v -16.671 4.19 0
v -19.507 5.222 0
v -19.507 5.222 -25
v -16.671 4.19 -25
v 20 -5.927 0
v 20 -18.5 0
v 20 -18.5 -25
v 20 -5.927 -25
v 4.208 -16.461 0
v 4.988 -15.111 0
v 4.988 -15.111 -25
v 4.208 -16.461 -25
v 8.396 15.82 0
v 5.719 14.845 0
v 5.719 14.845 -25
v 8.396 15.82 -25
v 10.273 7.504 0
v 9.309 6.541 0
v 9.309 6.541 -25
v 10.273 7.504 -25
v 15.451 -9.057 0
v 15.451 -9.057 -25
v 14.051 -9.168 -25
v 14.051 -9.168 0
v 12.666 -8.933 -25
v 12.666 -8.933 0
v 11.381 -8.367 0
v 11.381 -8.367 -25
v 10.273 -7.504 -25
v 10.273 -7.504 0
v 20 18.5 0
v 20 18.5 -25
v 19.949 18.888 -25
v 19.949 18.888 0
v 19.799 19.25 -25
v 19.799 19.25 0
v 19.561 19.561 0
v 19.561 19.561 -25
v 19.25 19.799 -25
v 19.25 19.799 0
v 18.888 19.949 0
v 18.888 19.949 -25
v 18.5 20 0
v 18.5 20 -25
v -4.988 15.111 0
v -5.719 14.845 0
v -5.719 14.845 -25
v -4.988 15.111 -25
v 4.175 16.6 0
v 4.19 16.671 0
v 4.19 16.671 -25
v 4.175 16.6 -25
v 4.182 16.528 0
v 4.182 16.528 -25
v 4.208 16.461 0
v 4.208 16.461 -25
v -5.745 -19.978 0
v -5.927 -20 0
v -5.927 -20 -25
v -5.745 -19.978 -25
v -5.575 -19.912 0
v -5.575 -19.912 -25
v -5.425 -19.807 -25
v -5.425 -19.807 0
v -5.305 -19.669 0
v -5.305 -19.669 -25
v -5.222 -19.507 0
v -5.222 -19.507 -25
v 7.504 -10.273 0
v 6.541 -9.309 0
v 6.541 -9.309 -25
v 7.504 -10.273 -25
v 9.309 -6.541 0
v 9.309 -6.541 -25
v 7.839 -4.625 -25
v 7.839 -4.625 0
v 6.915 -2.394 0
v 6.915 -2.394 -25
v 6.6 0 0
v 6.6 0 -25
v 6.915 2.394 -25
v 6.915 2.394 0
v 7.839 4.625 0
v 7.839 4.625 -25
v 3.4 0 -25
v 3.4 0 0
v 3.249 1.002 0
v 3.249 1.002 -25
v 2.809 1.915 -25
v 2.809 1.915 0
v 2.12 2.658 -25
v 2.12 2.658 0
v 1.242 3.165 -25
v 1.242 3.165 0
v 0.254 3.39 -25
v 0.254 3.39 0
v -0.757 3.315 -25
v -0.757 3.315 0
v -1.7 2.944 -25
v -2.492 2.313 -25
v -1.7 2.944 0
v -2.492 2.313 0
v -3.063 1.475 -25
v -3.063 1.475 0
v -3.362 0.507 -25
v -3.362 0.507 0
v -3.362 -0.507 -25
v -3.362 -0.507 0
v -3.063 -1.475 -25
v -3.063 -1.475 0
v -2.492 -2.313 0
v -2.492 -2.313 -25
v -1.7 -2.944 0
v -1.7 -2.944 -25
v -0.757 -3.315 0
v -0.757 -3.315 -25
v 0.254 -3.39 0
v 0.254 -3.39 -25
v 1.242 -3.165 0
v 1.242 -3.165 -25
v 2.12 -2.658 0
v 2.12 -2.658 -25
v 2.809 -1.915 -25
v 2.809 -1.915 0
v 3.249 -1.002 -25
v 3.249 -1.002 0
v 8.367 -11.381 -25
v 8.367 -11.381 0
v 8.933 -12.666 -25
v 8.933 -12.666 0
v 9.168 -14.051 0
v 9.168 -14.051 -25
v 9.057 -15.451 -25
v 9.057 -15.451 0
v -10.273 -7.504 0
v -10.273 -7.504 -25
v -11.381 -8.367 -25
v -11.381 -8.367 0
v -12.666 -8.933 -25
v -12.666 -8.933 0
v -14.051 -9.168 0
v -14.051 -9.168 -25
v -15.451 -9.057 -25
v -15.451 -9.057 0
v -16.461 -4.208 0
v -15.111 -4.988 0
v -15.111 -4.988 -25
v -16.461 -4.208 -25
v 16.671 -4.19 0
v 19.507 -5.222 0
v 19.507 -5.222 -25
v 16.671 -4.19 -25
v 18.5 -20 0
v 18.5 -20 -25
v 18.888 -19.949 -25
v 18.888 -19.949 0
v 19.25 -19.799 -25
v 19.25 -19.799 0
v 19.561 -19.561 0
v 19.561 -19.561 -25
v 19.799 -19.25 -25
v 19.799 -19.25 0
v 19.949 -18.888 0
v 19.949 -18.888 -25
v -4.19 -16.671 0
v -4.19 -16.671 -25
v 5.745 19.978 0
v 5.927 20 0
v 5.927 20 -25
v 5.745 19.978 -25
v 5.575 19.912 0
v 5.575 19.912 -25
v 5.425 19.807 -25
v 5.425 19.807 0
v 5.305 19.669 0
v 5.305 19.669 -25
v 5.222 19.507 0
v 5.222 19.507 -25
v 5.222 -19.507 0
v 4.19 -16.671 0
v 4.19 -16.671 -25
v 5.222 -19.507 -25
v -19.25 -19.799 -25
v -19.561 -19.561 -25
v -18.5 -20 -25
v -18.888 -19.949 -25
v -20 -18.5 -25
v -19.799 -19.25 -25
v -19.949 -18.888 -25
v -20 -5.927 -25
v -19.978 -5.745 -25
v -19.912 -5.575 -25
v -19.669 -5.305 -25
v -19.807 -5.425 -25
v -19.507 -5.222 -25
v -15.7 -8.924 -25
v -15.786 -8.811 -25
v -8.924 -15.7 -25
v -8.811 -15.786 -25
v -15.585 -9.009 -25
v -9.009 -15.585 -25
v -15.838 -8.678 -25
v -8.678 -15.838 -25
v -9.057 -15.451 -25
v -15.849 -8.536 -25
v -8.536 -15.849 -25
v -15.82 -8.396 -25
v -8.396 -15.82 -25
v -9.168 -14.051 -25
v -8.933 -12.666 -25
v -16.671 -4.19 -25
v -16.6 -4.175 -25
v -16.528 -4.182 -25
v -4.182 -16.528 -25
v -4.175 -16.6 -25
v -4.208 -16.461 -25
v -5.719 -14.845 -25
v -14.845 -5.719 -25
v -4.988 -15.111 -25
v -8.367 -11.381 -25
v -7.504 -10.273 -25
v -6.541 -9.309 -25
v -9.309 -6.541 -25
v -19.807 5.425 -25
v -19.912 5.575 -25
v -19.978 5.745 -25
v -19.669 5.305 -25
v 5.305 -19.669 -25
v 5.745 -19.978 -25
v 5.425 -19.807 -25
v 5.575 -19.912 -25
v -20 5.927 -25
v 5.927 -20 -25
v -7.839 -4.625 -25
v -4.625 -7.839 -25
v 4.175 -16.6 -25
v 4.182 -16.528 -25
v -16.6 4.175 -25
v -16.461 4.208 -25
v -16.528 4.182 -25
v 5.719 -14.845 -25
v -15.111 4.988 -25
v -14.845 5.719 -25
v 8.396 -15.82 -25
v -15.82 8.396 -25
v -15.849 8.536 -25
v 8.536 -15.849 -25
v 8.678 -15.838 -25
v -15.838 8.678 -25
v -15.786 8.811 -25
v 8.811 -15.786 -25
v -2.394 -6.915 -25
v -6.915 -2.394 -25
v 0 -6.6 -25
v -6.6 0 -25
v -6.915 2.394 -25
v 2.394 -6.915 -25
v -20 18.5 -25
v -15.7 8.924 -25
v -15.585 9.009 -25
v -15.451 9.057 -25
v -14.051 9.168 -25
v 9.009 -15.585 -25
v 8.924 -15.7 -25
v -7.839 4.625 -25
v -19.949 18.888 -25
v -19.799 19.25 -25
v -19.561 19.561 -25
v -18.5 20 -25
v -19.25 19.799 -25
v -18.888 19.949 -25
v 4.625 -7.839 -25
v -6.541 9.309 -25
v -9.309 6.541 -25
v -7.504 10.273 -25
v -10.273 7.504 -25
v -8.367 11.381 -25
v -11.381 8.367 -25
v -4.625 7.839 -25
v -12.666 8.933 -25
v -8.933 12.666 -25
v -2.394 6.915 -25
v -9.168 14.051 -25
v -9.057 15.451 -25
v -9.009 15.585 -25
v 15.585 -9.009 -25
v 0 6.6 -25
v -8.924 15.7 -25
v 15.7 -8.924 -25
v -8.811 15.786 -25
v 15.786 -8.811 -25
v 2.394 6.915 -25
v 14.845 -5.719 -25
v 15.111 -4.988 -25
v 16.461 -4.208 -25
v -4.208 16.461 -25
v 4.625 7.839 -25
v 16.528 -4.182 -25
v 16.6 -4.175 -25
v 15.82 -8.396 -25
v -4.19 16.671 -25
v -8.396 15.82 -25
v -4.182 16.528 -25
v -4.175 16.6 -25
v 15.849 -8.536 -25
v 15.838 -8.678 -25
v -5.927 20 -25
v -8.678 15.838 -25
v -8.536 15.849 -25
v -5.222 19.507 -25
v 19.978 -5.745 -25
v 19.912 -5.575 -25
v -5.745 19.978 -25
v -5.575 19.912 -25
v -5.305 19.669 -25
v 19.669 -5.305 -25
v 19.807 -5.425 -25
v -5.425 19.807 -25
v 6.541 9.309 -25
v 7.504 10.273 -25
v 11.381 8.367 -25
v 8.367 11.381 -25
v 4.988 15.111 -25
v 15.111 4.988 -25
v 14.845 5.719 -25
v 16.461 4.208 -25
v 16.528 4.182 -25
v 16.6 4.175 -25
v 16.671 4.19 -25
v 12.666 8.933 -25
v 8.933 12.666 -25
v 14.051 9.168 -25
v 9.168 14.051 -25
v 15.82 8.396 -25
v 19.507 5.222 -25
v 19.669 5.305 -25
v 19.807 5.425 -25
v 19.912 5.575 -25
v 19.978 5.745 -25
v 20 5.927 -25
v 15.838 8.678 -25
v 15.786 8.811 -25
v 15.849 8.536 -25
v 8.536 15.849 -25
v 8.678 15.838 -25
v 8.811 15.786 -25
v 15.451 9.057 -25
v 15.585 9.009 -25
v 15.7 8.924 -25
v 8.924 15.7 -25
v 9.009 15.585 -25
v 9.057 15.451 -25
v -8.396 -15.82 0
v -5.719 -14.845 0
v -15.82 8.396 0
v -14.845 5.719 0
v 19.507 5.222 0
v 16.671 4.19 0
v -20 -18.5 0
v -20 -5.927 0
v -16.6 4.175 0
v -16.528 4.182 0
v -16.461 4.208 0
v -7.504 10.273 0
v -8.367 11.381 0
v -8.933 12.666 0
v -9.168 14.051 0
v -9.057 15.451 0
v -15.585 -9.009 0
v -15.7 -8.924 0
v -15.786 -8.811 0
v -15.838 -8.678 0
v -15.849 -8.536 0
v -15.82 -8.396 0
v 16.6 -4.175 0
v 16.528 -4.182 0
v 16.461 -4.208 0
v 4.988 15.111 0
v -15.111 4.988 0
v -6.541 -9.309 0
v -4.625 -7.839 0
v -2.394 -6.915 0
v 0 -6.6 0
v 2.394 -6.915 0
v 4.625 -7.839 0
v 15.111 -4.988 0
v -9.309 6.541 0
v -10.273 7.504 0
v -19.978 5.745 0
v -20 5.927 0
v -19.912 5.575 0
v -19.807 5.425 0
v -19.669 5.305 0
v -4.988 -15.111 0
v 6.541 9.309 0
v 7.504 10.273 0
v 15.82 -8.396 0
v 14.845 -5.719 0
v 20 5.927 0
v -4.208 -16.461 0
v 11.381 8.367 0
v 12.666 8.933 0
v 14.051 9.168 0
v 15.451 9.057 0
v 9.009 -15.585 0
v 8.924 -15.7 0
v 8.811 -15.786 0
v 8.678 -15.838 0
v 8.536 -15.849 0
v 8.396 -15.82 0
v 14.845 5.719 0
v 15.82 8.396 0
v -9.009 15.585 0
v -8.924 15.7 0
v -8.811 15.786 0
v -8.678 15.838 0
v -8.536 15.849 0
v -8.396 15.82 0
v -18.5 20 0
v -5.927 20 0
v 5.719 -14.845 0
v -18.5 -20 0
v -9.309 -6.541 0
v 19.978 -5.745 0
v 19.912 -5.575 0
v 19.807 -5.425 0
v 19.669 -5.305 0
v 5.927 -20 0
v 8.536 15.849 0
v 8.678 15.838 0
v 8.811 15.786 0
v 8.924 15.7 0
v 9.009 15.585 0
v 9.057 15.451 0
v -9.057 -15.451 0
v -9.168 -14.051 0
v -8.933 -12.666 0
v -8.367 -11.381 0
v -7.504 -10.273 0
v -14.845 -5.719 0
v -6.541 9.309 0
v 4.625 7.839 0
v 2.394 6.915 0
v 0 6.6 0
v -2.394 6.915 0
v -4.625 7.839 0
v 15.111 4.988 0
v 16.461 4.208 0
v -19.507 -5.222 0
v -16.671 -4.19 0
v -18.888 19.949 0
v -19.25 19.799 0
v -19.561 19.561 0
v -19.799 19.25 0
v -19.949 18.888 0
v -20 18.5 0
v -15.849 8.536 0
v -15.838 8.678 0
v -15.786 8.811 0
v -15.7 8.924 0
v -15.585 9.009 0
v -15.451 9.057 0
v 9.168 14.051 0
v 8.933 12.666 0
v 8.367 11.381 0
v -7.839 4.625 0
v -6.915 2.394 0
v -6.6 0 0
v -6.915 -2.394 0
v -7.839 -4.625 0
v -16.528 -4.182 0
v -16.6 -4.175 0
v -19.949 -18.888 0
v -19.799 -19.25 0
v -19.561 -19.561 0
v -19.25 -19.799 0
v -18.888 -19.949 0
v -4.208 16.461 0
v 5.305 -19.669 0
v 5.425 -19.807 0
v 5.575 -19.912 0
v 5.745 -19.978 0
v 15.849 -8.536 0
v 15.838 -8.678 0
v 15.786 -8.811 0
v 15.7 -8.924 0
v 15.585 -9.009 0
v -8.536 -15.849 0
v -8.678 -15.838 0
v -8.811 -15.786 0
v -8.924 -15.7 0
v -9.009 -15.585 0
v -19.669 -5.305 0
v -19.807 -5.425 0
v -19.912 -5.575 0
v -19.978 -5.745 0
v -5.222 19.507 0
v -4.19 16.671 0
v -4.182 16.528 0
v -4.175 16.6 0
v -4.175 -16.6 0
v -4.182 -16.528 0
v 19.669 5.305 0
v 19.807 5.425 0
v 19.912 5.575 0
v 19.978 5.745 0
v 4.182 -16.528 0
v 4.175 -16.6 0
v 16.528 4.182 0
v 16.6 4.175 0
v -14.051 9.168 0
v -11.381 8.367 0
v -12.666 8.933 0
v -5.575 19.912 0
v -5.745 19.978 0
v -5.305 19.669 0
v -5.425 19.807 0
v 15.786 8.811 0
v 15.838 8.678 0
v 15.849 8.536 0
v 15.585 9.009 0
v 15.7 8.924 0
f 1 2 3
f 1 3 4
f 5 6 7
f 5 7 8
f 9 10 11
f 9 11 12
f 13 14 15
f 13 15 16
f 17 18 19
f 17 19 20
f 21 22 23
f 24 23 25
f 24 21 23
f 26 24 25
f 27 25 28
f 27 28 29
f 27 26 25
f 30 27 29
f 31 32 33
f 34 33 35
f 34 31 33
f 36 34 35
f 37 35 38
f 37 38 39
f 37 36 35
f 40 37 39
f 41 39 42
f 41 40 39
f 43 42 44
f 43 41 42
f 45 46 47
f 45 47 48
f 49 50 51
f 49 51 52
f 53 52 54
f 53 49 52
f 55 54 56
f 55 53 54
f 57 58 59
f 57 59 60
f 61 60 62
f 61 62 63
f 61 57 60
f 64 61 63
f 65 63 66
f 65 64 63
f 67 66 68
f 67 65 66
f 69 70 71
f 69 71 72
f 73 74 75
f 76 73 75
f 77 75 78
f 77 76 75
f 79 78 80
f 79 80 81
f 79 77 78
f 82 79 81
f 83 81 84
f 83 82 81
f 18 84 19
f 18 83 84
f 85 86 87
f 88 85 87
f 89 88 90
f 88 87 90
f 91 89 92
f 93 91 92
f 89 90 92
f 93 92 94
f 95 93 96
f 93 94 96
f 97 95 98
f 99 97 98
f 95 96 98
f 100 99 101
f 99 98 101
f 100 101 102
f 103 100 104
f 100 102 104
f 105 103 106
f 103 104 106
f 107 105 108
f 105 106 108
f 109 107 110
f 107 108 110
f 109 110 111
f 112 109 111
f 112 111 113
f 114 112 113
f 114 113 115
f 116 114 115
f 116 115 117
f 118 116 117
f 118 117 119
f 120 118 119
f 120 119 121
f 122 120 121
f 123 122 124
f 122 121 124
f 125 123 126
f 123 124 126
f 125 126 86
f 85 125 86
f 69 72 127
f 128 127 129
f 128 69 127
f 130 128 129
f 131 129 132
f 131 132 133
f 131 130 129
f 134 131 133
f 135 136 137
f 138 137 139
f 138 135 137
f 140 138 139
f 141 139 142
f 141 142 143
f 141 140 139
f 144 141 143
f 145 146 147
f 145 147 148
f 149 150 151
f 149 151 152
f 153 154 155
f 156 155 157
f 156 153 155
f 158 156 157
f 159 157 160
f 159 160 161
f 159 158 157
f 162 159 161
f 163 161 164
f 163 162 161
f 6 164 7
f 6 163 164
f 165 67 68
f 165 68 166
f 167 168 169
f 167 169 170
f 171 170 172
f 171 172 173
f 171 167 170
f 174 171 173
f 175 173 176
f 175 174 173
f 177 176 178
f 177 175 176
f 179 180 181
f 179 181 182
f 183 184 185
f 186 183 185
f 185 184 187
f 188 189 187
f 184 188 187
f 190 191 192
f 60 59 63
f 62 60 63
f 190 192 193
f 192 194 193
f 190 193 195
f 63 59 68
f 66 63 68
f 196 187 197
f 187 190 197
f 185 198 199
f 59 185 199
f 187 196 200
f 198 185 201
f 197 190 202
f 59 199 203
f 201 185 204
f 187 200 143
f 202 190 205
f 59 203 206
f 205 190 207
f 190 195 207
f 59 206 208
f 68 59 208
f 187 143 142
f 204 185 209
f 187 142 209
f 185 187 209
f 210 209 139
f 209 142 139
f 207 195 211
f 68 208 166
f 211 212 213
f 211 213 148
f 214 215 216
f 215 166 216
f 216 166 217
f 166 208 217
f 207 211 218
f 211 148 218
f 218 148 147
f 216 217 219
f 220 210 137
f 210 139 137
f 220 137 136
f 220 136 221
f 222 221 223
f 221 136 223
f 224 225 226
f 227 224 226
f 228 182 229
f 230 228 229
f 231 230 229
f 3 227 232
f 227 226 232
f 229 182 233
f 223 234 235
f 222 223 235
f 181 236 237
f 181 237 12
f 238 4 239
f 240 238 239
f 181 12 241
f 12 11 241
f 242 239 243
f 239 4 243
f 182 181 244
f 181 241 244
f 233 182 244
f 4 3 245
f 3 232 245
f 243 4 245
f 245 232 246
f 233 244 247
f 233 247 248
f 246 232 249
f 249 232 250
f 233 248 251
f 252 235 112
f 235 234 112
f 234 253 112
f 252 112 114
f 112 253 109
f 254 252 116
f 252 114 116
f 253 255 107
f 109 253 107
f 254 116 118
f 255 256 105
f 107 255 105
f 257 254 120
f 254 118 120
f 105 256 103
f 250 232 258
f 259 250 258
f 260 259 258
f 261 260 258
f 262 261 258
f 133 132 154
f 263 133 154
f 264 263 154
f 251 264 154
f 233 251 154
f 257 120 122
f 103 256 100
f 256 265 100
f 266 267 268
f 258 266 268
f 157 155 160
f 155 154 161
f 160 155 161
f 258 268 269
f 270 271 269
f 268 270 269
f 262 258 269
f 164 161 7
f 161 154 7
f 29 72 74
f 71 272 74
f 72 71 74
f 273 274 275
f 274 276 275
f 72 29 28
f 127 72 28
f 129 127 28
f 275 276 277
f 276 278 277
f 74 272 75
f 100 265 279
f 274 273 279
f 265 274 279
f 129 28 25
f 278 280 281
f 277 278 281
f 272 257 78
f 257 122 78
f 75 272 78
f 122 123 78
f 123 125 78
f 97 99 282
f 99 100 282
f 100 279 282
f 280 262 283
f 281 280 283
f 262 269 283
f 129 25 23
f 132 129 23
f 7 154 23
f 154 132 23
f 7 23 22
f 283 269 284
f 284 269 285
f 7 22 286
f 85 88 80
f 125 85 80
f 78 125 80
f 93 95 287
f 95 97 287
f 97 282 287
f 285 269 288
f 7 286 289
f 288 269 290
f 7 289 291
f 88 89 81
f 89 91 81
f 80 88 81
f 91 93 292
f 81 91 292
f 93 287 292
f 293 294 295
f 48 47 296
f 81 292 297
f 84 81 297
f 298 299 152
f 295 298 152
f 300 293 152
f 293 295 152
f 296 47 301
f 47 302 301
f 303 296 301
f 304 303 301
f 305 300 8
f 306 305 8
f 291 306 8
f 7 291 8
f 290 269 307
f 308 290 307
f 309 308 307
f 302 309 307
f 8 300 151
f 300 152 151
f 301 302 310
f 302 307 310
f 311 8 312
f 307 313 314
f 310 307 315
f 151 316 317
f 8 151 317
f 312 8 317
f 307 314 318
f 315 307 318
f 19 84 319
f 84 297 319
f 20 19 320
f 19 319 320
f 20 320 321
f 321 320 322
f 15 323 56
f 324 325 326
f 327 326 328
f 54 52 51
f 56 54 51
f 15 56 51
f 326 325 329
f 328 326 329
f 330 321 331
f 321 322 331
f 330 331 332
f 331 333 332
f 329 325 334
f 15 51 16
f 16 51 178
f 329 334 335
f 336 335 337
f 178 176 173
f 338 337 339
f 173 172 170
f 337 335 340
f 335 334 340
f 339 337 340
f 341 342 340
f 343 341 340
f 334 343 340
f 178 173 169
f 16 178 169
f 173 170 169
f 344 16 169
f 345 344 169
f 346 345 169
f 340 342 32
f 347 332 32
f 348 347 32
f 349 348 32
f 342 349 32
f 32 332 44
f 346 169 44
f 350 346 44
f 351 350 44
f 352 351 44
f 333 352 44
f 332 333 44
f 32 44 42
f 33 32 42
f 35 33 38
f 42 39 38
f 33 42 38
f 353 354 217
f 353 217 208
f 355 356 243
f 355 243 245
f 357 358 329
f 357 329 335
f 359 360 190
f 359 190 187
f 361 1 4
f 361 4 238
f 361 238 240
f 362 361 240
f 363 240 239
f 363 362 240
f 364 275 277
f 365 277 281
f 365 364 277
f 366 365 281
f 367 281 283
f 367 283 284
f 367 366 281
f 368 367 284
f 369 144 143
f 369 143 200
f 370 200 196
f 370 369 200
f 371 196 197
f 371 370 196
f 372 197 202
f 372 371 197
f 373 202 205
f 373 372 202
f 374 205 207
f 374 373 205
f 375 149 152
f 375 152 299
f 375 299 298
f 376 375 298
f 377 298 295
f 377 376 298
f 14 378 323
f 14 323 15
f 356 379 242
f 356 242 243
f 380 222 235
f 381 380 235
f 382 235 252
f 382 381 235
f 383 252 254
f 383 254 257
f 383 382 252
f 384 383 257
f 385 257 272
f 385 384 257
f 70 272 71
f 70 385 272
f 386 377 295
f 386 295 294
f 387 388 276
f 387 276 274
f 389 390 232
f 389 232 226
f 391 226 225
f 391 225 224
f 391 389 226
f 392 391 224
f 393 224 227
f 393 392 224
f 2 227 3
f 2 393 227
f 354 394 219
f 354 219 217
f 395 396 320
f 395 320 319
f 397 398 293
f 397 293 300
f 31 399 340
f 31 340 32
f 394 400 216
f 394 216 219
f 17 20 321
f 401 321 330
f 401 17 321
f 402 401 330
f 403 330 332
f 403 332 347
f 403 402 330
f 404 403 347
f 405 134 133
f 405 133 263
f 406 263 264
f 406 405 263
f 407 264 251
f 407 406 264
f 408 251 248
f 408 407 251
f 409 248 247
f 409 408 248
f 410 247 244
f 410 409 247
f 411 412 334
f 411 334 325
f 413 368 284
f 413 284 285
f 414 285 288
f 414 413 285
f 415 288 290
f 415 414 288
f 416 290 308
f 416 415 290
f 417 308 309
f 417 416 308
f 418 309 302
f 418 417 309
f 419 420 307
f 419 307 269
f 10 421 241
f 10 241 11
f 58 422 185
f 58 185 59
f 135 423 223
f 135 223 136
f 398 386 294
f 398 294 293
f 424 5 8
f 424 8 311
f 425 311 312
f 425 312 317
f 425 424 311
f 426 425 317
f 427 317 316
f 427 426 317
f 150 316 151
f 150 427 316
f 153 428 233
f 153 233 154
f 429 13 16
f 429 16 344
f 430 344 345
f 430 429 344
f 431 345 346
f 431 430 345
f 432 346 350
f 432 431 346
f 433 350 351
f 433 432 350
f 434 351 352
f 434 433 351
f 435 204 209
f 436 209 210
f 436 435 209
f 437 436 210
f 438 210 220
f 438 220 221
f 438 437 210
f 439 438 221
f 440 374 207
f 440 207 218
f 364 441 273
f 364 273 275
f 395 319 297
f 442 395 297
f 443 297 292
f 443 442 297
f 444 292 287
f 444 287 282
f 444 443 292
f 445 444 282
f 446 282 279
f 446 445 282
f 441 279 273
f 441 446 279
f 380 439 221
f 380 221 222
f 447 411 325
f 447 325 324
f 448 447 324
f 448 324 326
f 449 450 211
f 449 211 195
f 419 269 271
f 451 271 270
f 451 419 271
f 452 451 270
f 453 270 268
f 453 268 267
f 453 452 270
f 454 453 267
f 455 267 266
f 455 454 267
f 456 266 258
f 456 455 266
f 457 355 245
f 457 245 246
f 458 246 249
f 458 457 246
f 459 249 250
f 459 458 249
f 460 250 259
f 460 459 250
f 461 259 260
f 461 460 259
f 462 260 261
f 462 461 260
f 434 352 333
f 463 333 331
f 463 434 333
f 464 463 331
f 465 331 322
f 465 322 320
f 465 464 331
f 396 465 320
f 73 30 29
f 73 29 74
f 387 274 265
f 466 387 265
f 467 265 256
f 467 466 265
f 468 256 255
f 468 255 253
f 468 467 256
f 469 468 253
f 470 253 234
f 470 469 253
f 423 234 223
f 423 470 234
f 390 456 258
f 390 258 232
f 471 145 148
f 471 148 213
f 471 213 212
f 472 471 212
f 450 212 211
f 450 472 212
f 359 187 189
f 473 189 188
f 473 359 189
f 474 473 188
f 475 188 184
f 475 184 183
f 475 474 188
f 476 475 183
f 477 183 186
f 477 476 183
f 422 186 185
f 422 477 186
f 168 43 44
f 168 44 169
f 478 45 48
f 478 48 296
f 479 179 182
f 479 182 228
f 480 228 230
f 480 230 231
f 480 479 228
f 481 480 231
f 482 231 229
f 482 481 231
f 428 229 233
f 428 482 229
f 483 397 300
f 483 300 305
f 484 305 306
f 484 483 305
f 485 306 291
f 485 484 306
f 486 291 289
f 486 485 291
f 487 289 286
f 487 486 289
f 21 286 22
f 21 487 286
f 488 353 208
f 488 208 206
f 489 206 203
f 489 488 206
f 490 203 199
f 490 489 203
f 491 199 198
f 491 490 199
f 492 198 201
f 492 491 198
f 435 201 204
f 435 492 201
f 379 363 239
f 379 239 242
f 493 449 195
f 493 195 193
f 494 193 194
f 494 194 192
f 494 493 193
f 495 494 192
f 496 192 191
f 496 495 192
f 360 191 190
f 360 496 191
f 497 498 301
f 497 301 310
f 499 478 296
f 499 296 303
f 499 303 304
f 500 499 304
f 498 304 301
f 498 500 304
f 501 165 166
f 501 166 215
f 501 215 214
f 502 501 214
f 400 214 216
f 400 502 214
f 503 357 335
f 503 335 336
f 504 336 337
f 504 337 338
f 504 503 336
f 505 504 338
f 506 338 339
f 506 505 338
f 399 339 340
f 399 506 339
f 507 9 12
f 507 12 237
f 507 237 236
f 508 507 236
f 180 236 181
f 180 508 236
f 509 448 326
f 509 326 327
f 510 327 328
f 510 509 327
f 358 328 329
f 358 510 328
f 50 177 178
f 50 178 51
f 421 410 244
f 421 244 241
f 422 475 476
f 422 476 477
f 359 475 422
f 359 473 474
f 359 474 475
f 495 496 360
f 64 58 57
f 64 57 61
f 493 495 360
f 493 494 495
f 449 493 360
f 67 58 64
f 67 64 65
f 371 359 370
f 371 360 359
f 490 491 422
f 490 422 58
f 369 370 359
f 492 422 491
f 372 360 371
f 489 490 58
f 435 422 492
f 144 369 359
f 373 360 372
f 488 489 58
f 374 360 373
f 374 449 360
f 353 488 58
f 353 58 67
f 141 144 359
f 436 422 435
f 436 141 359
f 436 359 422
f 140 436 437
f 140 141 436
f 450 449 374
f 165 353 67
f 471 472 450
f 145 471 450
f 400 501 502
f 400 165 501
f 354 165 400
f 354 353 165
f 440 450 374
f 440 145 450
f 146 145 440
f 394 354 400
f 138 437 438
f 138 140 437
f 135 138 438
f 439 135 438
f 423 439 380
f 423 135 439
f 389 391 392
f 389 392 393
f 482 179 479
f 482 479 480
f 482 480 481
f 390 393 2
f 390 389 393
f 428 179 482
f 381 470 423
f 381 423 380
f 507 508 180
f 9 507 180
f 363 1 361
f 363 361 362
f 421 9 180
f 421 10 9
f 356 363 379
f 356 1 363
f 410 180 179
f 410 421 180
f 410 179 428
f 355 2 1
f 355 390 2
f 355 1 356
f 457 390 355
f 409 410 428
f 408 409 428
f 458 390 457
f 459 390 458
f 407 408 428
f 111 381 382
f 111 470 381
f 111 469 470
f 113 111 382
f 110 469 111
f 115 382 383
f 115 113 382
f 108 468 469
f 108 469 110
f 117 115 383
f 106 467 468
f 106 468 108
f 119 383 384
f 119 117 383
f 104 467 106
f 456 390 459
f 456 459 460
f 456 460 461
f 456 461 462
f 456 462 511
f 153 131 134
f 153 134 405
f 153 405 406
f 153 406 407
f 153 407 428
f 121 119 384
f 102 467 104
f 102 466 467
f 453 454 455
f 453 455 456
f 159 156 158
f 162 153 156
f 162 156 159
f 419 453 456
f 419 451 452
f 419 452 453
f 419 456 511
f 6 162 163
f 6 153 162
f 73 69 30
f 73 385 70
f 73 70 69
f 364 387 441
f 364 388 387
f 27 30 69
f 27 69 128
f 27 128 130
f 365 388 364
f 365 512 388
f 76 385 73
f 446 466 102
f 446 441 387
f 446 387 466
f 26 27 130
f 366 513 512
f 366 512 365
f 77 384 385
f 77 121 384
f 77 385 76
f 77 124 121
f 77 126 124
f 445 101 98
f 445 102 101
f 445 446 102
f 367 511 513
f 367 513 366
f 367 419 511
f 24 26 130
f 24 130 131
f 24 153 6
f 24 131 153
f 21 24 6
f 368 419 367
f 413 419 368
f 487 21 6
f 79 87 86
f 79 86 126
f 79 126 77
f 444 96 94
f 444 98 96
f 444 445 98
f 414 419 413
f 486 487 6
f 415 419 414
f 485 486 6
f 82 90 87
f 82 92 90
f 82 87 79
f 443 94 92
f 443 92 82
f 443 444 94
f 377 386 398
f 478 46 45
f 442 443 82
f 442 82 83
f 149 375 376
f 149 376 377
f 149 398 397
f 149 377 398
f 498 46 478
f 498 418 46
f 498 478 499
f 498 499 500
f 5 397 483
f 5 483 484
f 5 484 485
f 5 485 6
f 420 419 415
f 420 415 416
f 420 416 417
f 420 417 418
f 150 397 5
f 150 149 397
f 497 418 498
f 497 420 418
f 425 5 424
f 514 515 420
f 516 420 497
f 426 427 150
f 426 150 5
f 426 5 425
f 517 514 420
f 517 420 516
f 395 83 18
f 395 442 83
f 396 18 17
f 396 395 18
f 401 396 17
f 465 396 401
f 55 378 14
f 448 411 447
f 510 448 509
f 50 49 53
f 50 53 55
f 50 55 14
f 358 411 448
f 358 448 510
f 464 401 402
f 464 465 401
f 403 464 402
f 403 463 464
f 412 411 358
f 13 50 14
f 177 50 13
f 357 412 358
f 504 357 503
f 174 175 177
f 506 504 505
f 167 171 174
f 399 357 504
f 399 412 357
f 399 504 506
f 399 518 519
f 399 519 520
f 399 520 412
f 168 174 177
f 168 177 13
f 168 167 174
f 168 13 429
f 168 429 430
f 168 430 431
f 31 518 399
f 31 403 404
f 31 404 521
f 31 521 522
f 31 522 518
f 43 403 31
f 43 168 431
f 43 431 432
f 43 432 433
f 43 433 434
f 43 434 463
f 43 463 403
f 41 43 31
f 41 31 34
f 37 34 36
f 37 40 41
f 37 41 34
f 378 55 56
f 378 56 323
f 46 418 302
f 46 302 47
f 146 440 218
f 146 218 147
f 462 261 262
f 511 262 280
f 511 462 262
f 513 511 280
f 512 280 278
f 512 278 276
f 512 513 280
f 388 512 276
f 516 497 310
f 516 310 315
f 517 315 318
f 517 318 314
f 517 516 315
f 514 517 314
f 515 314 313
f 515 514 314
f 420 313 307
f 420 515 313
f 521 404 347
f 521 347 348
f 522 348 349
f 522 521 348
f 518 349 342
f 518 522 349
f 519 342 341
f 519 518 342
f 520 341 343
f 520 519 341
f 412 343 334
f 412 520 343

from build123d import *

# Parameters (mm, degrees)
SK_MAIN_EXTRUSION_R  = 3.4
MAIN_EXTRUSION_DEPTH = 25


with BuildPart() as part:
    # Sk Main Extrusion → Main Extrusion (new body)
    with BuildSketch(Plane.XY):
        with BuildLine():
            Line((4.190076845, -16.671180212), (5.222054351, -19.506515107))
            ThreePointArc((5.222054351, -19.506515107), (5.496641489, -19.864364033), (5.926823816, -20))
            Line((5.926823816, -20), (18.5, -20))
            ThreePointArc((18.5, -20), (19.560660172, -19.560660172), (20, -18.5))
            Line((20, -18.5), (20, -5.926823816))
            ThreePointArc((20, -5.926823816), (19.864364033, -5.496641489), (19.506515107, -5.222054351))
            Line((19.506515107, -5.222054351), (16.671180212, -4.190076845))
            ThreePointArc((16.671180212, -4.190076845), (16.563886241, -4.175951325), (16.460675177, -4.208493649))
            Line((16.460675177, -4.208493649), (15.111296024, -4.987558066))
            Line((15.111296024, -4.987558066), (14.845251581, -5.718509166))
            Line((14.845251581, -5.718509166), (15.81984631, -8.396186179))
            ThreePointArc((15.81984631, -8.396186179), (15.786489799, -8.811074612), (15.450654467, -9.056960151))
            ThreePointArc((15.450654467, -9.056960151), (12.665882372, -8.933433013), (10.272684887, -7.504160339))
            Line((10.272684887, -7.504160339), (9.309262274, -6.540737726))
            ThreePointArc((9.309262274, -6.540737726), (6.6, 0), (9.309262274, 6.540737726))
            Line((9.309262274, 6.540737726), (10.272684887, 7.504160339))
            ThreePointArc((10.272684887, 7.504160339), (12.665882372, 8.933433013), (15.450654467, 9.056960151))
            ThreePointArc((15.450654467, 9.056960151), (15.786489799, 8.811074612), (15.81984631, 8.396186179))
            Line((15.81984631, 8.396186179), (14.845251581, 5.718509166))
            Line((14.845251581, 5.718509166), (15.111296024, 4.987558066))
            Line((15.111296024, 4.987558066), (16.460675176, 4.208493649))
            ThreePointArc((16.460675176, 4.208493649), (16.563886241, 4.175951325), (16.671180212, 4.190076845))
            Line((16.671180212, 4.190076845), (19.506515107, 5.222054351))
            ThreePointArc((19.506515107, 5.222054351), (19.864364033, 5.496641489), (20, 5.926823816))
            Line((20, 5.926823816), (20, 18.5))
            ThreePointArc((20, 18.5), (19.560660172, 19.560660172), (18.5, 20))
            Line((18.5, 20), (5.926823816, 20))
            ThreePointArc((5.926823816, 20), (5.496641489, 19.864364033), (5.222054351, 19.506515107))
            Line((5.222054351, 19.506515107), (4.190076845, 16.671180212))
            ThreePointArc((4.190076845, 16.671180212), (4.175951325, 16.563886241), (4.208493649, 16.460675176))
            Line((4.208493649, 16.460675176), (4.987558066, 15.111296024))
            Line((4.987558066, 15.111296024), (5.718509166, 14.845251581))
            Line((5.718509166, 14.845251581), (8.396186179, 15.81984631))
            ThreePointArc((8.396186179, 15.81984631), (8.811074612, 15.786489799), (9.056960151, 15.450654467))
            ThreePointArc((9.056960151, 15.450654467), (8.933433013, 12.665882372), (7.504160339, 10.272684887))
            Line((7.504160339, 10.272684887), (6.540737726, 9.309262274))
            ThreePointArc((6.540737726, 9.309262274), (0, 6.6), (-6.540737726, 9.309262274))
            Line((-6.540737726, 9.309262274), (-7.504160339, 10.272684887))
            ThreePointArc((-7.504160339, 10.272684887), (-8.933433013, 12.665882372), (-9.056960151, 15.450654467))
            ThreePointArc((-9.056960151, 15.450654467), (-8.811074612, 15.786489799), (-8.396186179, 15.81984631))
            Line((-8.396186179, 15.81984631), (-5.718509166, 14.845251581))
            Line((-5.718509166, 14.845251581), (-4.987558066, 15.111296024))
            Line((-4.987558066, 15.111296024), (-4.208493649, 16.460675177))
            ThreePointArc((-4.208493649, 16.460675177), (-4.175951325, 16.563886241), (-4.190076845, 16.671180212))
            Line((-4.190076845, 16.671180212), (-5.222054351, 19.506515107))
            ThreePointArc((-5.222054351, 19.506515107), (-5.496641489, 19.864364033), (-5.926823816, 20))
            Line((-5.926823816, 20), (-18.5, 20))
            ThreePointArc((-18.5, 20), (-19.560660172, 19.560660172), (-20, 18.5))
            Line((-20, 18.5), (-20, 5.926823816))
            ThreePointArc((-20, 5.926823816), (-19.864364033, 5.496641489), (-19.506515107, 5.222054351))
            Line((-19.506515107, 5.222054351), (-16.671180212, 4.190076845))
            ThreePointArc((-16.671180212, 4.190076845), (-16.563886241, 4.175951325), (-16.460675177, 4.208493649))
            Line((-16.460675177, 4.208493649), (-15.111296024, 4.987558066))
            Line((-15.111296024, 4.987558066), (-14.845251581, 5.718509166))
            Line((-14.845251581, 5.718509166), (-15.81984631, 8.396186179))
            ThreePointArc((-15.81984631, 8.396186179), (-15.786489799, 8.811074612), (-15.450654467, 9.056960151))
            ThreePointArc((-15.450654467, 9.056960151), (-12.665882372, 8.933433013), (-10.272684887, 7.504160339))
            Line((-10.272684887, 7.504160339), (-9.309262274, 6.540737726))
            ThreePointArc((-9.309262274, 6.540737726), (-6.6, 0), (-9.309262274, -6.540737726))
            Line((-9.309262274, -6.540737726), (-10.272684887, -7.504160339))
            ThreePointArc((-10.272684887, -7.504160339), (-12.665882372, -8.933433013), (-15.450654467, -9.056960151))
            ThreePointArc((-15.450654467, -9.056960151), (-15.786489799, -8.811074612), (-15.81984631, -8.396186179))
            Line((-15.81984631, -8.396186179), (-14.845251581, -5.718509166))
            Line((-14.845251581, -5.718509166), (-15.111296024, -4.987558066))
            Line((-15.111296024, -4.987558066), (-16.460675177, -4.208493649))
            ThreePointArc((-16.460675177, -4.208493649), (-16.563886241, -4.175951325), (-16.671180212, -4.190076845))
            Line((-16.671180212, -4.190076845), (-19.506515107, -5.222054351))
            ThreePointArc((-19.506515107, -5.222054351), (-19.864364033, -5.496641489), (-20, -5.926823816))
            Line((-20, -5.926823816), (-20, -18.5))
            ThreePointArc((-20, -18.5), (-19.560660172, -19.560660172), (-18.5, -20))
            Line((-18.5, -20), (-5.926823816, -20))
            ThreePointArc((-5.926823816, -20), (-5.496641489, -19.864364033), (-5.222054351, -19.506515107))
            Line((-5.222054351, -19.506515107), (-4.190076845, -16.671180212))
            ThreePointArc((-4.190076845, -16.671180212), (-4.175951325, -16.563886241), (-4.208493649, -16.460675177))
            Line((-4.208493649, -16.460675177), (-4.987558066, -15.111296024))
            Line((-4.987558066, -15.111296024), (-5.718509166, -14.845251581))
            Line((-5.718509166, -14.845251581), (-8.396186179, -15.81984631))
            ThreePointArc((-8.396186179, -15.81984631), (-8.811074612, -15.786489799), (-9.056960151, -15.450654467))
            ThreePointArc((-9.056960151, -15.450654467), (-8.933433013, -12.665882372), (-7.504160339, -10.272684887))
            Line((-7.504160339, -10.272684887), (-6.540737726, -9.309262274))
            ThreePointArc((-6.540737726, -9.309262274), (0, -6.6), (6.540737726, -9.309262274))
            Line((6.540737726, -9.309262274), (7.504160339, -10.272684887))
            ThreePointArc((7.504160339, -10.272684887), (8.933433013, -12.665882372), (9.056960151, -15.450654467))
            ThreePointArc((9.056960151, -15.450654467), (8.811074612, -15.786489799), (8.396186179, -15.81984631))
            Line((8.396186179, -15.81984631), (5.718509166, -14.845251581))
            Line((5.718509166, -14.845251581), (4.987558066, -15.111296024))
            Line((4.987558066, -15.111296024), (4.208493649, -16.460675177))
            ThreePointArc((4.208493649, -16.460675177), (4.175951325, -16.563886241), (4.190076845, -16.671180212))
        make_face()
        Circle(SK_MAIN_EXTRUSION_R, mode=Mode.SUBTRACT)
    extrude(amount=-MAIN_EXTRUSION_DEPTH)


solid = part.part
